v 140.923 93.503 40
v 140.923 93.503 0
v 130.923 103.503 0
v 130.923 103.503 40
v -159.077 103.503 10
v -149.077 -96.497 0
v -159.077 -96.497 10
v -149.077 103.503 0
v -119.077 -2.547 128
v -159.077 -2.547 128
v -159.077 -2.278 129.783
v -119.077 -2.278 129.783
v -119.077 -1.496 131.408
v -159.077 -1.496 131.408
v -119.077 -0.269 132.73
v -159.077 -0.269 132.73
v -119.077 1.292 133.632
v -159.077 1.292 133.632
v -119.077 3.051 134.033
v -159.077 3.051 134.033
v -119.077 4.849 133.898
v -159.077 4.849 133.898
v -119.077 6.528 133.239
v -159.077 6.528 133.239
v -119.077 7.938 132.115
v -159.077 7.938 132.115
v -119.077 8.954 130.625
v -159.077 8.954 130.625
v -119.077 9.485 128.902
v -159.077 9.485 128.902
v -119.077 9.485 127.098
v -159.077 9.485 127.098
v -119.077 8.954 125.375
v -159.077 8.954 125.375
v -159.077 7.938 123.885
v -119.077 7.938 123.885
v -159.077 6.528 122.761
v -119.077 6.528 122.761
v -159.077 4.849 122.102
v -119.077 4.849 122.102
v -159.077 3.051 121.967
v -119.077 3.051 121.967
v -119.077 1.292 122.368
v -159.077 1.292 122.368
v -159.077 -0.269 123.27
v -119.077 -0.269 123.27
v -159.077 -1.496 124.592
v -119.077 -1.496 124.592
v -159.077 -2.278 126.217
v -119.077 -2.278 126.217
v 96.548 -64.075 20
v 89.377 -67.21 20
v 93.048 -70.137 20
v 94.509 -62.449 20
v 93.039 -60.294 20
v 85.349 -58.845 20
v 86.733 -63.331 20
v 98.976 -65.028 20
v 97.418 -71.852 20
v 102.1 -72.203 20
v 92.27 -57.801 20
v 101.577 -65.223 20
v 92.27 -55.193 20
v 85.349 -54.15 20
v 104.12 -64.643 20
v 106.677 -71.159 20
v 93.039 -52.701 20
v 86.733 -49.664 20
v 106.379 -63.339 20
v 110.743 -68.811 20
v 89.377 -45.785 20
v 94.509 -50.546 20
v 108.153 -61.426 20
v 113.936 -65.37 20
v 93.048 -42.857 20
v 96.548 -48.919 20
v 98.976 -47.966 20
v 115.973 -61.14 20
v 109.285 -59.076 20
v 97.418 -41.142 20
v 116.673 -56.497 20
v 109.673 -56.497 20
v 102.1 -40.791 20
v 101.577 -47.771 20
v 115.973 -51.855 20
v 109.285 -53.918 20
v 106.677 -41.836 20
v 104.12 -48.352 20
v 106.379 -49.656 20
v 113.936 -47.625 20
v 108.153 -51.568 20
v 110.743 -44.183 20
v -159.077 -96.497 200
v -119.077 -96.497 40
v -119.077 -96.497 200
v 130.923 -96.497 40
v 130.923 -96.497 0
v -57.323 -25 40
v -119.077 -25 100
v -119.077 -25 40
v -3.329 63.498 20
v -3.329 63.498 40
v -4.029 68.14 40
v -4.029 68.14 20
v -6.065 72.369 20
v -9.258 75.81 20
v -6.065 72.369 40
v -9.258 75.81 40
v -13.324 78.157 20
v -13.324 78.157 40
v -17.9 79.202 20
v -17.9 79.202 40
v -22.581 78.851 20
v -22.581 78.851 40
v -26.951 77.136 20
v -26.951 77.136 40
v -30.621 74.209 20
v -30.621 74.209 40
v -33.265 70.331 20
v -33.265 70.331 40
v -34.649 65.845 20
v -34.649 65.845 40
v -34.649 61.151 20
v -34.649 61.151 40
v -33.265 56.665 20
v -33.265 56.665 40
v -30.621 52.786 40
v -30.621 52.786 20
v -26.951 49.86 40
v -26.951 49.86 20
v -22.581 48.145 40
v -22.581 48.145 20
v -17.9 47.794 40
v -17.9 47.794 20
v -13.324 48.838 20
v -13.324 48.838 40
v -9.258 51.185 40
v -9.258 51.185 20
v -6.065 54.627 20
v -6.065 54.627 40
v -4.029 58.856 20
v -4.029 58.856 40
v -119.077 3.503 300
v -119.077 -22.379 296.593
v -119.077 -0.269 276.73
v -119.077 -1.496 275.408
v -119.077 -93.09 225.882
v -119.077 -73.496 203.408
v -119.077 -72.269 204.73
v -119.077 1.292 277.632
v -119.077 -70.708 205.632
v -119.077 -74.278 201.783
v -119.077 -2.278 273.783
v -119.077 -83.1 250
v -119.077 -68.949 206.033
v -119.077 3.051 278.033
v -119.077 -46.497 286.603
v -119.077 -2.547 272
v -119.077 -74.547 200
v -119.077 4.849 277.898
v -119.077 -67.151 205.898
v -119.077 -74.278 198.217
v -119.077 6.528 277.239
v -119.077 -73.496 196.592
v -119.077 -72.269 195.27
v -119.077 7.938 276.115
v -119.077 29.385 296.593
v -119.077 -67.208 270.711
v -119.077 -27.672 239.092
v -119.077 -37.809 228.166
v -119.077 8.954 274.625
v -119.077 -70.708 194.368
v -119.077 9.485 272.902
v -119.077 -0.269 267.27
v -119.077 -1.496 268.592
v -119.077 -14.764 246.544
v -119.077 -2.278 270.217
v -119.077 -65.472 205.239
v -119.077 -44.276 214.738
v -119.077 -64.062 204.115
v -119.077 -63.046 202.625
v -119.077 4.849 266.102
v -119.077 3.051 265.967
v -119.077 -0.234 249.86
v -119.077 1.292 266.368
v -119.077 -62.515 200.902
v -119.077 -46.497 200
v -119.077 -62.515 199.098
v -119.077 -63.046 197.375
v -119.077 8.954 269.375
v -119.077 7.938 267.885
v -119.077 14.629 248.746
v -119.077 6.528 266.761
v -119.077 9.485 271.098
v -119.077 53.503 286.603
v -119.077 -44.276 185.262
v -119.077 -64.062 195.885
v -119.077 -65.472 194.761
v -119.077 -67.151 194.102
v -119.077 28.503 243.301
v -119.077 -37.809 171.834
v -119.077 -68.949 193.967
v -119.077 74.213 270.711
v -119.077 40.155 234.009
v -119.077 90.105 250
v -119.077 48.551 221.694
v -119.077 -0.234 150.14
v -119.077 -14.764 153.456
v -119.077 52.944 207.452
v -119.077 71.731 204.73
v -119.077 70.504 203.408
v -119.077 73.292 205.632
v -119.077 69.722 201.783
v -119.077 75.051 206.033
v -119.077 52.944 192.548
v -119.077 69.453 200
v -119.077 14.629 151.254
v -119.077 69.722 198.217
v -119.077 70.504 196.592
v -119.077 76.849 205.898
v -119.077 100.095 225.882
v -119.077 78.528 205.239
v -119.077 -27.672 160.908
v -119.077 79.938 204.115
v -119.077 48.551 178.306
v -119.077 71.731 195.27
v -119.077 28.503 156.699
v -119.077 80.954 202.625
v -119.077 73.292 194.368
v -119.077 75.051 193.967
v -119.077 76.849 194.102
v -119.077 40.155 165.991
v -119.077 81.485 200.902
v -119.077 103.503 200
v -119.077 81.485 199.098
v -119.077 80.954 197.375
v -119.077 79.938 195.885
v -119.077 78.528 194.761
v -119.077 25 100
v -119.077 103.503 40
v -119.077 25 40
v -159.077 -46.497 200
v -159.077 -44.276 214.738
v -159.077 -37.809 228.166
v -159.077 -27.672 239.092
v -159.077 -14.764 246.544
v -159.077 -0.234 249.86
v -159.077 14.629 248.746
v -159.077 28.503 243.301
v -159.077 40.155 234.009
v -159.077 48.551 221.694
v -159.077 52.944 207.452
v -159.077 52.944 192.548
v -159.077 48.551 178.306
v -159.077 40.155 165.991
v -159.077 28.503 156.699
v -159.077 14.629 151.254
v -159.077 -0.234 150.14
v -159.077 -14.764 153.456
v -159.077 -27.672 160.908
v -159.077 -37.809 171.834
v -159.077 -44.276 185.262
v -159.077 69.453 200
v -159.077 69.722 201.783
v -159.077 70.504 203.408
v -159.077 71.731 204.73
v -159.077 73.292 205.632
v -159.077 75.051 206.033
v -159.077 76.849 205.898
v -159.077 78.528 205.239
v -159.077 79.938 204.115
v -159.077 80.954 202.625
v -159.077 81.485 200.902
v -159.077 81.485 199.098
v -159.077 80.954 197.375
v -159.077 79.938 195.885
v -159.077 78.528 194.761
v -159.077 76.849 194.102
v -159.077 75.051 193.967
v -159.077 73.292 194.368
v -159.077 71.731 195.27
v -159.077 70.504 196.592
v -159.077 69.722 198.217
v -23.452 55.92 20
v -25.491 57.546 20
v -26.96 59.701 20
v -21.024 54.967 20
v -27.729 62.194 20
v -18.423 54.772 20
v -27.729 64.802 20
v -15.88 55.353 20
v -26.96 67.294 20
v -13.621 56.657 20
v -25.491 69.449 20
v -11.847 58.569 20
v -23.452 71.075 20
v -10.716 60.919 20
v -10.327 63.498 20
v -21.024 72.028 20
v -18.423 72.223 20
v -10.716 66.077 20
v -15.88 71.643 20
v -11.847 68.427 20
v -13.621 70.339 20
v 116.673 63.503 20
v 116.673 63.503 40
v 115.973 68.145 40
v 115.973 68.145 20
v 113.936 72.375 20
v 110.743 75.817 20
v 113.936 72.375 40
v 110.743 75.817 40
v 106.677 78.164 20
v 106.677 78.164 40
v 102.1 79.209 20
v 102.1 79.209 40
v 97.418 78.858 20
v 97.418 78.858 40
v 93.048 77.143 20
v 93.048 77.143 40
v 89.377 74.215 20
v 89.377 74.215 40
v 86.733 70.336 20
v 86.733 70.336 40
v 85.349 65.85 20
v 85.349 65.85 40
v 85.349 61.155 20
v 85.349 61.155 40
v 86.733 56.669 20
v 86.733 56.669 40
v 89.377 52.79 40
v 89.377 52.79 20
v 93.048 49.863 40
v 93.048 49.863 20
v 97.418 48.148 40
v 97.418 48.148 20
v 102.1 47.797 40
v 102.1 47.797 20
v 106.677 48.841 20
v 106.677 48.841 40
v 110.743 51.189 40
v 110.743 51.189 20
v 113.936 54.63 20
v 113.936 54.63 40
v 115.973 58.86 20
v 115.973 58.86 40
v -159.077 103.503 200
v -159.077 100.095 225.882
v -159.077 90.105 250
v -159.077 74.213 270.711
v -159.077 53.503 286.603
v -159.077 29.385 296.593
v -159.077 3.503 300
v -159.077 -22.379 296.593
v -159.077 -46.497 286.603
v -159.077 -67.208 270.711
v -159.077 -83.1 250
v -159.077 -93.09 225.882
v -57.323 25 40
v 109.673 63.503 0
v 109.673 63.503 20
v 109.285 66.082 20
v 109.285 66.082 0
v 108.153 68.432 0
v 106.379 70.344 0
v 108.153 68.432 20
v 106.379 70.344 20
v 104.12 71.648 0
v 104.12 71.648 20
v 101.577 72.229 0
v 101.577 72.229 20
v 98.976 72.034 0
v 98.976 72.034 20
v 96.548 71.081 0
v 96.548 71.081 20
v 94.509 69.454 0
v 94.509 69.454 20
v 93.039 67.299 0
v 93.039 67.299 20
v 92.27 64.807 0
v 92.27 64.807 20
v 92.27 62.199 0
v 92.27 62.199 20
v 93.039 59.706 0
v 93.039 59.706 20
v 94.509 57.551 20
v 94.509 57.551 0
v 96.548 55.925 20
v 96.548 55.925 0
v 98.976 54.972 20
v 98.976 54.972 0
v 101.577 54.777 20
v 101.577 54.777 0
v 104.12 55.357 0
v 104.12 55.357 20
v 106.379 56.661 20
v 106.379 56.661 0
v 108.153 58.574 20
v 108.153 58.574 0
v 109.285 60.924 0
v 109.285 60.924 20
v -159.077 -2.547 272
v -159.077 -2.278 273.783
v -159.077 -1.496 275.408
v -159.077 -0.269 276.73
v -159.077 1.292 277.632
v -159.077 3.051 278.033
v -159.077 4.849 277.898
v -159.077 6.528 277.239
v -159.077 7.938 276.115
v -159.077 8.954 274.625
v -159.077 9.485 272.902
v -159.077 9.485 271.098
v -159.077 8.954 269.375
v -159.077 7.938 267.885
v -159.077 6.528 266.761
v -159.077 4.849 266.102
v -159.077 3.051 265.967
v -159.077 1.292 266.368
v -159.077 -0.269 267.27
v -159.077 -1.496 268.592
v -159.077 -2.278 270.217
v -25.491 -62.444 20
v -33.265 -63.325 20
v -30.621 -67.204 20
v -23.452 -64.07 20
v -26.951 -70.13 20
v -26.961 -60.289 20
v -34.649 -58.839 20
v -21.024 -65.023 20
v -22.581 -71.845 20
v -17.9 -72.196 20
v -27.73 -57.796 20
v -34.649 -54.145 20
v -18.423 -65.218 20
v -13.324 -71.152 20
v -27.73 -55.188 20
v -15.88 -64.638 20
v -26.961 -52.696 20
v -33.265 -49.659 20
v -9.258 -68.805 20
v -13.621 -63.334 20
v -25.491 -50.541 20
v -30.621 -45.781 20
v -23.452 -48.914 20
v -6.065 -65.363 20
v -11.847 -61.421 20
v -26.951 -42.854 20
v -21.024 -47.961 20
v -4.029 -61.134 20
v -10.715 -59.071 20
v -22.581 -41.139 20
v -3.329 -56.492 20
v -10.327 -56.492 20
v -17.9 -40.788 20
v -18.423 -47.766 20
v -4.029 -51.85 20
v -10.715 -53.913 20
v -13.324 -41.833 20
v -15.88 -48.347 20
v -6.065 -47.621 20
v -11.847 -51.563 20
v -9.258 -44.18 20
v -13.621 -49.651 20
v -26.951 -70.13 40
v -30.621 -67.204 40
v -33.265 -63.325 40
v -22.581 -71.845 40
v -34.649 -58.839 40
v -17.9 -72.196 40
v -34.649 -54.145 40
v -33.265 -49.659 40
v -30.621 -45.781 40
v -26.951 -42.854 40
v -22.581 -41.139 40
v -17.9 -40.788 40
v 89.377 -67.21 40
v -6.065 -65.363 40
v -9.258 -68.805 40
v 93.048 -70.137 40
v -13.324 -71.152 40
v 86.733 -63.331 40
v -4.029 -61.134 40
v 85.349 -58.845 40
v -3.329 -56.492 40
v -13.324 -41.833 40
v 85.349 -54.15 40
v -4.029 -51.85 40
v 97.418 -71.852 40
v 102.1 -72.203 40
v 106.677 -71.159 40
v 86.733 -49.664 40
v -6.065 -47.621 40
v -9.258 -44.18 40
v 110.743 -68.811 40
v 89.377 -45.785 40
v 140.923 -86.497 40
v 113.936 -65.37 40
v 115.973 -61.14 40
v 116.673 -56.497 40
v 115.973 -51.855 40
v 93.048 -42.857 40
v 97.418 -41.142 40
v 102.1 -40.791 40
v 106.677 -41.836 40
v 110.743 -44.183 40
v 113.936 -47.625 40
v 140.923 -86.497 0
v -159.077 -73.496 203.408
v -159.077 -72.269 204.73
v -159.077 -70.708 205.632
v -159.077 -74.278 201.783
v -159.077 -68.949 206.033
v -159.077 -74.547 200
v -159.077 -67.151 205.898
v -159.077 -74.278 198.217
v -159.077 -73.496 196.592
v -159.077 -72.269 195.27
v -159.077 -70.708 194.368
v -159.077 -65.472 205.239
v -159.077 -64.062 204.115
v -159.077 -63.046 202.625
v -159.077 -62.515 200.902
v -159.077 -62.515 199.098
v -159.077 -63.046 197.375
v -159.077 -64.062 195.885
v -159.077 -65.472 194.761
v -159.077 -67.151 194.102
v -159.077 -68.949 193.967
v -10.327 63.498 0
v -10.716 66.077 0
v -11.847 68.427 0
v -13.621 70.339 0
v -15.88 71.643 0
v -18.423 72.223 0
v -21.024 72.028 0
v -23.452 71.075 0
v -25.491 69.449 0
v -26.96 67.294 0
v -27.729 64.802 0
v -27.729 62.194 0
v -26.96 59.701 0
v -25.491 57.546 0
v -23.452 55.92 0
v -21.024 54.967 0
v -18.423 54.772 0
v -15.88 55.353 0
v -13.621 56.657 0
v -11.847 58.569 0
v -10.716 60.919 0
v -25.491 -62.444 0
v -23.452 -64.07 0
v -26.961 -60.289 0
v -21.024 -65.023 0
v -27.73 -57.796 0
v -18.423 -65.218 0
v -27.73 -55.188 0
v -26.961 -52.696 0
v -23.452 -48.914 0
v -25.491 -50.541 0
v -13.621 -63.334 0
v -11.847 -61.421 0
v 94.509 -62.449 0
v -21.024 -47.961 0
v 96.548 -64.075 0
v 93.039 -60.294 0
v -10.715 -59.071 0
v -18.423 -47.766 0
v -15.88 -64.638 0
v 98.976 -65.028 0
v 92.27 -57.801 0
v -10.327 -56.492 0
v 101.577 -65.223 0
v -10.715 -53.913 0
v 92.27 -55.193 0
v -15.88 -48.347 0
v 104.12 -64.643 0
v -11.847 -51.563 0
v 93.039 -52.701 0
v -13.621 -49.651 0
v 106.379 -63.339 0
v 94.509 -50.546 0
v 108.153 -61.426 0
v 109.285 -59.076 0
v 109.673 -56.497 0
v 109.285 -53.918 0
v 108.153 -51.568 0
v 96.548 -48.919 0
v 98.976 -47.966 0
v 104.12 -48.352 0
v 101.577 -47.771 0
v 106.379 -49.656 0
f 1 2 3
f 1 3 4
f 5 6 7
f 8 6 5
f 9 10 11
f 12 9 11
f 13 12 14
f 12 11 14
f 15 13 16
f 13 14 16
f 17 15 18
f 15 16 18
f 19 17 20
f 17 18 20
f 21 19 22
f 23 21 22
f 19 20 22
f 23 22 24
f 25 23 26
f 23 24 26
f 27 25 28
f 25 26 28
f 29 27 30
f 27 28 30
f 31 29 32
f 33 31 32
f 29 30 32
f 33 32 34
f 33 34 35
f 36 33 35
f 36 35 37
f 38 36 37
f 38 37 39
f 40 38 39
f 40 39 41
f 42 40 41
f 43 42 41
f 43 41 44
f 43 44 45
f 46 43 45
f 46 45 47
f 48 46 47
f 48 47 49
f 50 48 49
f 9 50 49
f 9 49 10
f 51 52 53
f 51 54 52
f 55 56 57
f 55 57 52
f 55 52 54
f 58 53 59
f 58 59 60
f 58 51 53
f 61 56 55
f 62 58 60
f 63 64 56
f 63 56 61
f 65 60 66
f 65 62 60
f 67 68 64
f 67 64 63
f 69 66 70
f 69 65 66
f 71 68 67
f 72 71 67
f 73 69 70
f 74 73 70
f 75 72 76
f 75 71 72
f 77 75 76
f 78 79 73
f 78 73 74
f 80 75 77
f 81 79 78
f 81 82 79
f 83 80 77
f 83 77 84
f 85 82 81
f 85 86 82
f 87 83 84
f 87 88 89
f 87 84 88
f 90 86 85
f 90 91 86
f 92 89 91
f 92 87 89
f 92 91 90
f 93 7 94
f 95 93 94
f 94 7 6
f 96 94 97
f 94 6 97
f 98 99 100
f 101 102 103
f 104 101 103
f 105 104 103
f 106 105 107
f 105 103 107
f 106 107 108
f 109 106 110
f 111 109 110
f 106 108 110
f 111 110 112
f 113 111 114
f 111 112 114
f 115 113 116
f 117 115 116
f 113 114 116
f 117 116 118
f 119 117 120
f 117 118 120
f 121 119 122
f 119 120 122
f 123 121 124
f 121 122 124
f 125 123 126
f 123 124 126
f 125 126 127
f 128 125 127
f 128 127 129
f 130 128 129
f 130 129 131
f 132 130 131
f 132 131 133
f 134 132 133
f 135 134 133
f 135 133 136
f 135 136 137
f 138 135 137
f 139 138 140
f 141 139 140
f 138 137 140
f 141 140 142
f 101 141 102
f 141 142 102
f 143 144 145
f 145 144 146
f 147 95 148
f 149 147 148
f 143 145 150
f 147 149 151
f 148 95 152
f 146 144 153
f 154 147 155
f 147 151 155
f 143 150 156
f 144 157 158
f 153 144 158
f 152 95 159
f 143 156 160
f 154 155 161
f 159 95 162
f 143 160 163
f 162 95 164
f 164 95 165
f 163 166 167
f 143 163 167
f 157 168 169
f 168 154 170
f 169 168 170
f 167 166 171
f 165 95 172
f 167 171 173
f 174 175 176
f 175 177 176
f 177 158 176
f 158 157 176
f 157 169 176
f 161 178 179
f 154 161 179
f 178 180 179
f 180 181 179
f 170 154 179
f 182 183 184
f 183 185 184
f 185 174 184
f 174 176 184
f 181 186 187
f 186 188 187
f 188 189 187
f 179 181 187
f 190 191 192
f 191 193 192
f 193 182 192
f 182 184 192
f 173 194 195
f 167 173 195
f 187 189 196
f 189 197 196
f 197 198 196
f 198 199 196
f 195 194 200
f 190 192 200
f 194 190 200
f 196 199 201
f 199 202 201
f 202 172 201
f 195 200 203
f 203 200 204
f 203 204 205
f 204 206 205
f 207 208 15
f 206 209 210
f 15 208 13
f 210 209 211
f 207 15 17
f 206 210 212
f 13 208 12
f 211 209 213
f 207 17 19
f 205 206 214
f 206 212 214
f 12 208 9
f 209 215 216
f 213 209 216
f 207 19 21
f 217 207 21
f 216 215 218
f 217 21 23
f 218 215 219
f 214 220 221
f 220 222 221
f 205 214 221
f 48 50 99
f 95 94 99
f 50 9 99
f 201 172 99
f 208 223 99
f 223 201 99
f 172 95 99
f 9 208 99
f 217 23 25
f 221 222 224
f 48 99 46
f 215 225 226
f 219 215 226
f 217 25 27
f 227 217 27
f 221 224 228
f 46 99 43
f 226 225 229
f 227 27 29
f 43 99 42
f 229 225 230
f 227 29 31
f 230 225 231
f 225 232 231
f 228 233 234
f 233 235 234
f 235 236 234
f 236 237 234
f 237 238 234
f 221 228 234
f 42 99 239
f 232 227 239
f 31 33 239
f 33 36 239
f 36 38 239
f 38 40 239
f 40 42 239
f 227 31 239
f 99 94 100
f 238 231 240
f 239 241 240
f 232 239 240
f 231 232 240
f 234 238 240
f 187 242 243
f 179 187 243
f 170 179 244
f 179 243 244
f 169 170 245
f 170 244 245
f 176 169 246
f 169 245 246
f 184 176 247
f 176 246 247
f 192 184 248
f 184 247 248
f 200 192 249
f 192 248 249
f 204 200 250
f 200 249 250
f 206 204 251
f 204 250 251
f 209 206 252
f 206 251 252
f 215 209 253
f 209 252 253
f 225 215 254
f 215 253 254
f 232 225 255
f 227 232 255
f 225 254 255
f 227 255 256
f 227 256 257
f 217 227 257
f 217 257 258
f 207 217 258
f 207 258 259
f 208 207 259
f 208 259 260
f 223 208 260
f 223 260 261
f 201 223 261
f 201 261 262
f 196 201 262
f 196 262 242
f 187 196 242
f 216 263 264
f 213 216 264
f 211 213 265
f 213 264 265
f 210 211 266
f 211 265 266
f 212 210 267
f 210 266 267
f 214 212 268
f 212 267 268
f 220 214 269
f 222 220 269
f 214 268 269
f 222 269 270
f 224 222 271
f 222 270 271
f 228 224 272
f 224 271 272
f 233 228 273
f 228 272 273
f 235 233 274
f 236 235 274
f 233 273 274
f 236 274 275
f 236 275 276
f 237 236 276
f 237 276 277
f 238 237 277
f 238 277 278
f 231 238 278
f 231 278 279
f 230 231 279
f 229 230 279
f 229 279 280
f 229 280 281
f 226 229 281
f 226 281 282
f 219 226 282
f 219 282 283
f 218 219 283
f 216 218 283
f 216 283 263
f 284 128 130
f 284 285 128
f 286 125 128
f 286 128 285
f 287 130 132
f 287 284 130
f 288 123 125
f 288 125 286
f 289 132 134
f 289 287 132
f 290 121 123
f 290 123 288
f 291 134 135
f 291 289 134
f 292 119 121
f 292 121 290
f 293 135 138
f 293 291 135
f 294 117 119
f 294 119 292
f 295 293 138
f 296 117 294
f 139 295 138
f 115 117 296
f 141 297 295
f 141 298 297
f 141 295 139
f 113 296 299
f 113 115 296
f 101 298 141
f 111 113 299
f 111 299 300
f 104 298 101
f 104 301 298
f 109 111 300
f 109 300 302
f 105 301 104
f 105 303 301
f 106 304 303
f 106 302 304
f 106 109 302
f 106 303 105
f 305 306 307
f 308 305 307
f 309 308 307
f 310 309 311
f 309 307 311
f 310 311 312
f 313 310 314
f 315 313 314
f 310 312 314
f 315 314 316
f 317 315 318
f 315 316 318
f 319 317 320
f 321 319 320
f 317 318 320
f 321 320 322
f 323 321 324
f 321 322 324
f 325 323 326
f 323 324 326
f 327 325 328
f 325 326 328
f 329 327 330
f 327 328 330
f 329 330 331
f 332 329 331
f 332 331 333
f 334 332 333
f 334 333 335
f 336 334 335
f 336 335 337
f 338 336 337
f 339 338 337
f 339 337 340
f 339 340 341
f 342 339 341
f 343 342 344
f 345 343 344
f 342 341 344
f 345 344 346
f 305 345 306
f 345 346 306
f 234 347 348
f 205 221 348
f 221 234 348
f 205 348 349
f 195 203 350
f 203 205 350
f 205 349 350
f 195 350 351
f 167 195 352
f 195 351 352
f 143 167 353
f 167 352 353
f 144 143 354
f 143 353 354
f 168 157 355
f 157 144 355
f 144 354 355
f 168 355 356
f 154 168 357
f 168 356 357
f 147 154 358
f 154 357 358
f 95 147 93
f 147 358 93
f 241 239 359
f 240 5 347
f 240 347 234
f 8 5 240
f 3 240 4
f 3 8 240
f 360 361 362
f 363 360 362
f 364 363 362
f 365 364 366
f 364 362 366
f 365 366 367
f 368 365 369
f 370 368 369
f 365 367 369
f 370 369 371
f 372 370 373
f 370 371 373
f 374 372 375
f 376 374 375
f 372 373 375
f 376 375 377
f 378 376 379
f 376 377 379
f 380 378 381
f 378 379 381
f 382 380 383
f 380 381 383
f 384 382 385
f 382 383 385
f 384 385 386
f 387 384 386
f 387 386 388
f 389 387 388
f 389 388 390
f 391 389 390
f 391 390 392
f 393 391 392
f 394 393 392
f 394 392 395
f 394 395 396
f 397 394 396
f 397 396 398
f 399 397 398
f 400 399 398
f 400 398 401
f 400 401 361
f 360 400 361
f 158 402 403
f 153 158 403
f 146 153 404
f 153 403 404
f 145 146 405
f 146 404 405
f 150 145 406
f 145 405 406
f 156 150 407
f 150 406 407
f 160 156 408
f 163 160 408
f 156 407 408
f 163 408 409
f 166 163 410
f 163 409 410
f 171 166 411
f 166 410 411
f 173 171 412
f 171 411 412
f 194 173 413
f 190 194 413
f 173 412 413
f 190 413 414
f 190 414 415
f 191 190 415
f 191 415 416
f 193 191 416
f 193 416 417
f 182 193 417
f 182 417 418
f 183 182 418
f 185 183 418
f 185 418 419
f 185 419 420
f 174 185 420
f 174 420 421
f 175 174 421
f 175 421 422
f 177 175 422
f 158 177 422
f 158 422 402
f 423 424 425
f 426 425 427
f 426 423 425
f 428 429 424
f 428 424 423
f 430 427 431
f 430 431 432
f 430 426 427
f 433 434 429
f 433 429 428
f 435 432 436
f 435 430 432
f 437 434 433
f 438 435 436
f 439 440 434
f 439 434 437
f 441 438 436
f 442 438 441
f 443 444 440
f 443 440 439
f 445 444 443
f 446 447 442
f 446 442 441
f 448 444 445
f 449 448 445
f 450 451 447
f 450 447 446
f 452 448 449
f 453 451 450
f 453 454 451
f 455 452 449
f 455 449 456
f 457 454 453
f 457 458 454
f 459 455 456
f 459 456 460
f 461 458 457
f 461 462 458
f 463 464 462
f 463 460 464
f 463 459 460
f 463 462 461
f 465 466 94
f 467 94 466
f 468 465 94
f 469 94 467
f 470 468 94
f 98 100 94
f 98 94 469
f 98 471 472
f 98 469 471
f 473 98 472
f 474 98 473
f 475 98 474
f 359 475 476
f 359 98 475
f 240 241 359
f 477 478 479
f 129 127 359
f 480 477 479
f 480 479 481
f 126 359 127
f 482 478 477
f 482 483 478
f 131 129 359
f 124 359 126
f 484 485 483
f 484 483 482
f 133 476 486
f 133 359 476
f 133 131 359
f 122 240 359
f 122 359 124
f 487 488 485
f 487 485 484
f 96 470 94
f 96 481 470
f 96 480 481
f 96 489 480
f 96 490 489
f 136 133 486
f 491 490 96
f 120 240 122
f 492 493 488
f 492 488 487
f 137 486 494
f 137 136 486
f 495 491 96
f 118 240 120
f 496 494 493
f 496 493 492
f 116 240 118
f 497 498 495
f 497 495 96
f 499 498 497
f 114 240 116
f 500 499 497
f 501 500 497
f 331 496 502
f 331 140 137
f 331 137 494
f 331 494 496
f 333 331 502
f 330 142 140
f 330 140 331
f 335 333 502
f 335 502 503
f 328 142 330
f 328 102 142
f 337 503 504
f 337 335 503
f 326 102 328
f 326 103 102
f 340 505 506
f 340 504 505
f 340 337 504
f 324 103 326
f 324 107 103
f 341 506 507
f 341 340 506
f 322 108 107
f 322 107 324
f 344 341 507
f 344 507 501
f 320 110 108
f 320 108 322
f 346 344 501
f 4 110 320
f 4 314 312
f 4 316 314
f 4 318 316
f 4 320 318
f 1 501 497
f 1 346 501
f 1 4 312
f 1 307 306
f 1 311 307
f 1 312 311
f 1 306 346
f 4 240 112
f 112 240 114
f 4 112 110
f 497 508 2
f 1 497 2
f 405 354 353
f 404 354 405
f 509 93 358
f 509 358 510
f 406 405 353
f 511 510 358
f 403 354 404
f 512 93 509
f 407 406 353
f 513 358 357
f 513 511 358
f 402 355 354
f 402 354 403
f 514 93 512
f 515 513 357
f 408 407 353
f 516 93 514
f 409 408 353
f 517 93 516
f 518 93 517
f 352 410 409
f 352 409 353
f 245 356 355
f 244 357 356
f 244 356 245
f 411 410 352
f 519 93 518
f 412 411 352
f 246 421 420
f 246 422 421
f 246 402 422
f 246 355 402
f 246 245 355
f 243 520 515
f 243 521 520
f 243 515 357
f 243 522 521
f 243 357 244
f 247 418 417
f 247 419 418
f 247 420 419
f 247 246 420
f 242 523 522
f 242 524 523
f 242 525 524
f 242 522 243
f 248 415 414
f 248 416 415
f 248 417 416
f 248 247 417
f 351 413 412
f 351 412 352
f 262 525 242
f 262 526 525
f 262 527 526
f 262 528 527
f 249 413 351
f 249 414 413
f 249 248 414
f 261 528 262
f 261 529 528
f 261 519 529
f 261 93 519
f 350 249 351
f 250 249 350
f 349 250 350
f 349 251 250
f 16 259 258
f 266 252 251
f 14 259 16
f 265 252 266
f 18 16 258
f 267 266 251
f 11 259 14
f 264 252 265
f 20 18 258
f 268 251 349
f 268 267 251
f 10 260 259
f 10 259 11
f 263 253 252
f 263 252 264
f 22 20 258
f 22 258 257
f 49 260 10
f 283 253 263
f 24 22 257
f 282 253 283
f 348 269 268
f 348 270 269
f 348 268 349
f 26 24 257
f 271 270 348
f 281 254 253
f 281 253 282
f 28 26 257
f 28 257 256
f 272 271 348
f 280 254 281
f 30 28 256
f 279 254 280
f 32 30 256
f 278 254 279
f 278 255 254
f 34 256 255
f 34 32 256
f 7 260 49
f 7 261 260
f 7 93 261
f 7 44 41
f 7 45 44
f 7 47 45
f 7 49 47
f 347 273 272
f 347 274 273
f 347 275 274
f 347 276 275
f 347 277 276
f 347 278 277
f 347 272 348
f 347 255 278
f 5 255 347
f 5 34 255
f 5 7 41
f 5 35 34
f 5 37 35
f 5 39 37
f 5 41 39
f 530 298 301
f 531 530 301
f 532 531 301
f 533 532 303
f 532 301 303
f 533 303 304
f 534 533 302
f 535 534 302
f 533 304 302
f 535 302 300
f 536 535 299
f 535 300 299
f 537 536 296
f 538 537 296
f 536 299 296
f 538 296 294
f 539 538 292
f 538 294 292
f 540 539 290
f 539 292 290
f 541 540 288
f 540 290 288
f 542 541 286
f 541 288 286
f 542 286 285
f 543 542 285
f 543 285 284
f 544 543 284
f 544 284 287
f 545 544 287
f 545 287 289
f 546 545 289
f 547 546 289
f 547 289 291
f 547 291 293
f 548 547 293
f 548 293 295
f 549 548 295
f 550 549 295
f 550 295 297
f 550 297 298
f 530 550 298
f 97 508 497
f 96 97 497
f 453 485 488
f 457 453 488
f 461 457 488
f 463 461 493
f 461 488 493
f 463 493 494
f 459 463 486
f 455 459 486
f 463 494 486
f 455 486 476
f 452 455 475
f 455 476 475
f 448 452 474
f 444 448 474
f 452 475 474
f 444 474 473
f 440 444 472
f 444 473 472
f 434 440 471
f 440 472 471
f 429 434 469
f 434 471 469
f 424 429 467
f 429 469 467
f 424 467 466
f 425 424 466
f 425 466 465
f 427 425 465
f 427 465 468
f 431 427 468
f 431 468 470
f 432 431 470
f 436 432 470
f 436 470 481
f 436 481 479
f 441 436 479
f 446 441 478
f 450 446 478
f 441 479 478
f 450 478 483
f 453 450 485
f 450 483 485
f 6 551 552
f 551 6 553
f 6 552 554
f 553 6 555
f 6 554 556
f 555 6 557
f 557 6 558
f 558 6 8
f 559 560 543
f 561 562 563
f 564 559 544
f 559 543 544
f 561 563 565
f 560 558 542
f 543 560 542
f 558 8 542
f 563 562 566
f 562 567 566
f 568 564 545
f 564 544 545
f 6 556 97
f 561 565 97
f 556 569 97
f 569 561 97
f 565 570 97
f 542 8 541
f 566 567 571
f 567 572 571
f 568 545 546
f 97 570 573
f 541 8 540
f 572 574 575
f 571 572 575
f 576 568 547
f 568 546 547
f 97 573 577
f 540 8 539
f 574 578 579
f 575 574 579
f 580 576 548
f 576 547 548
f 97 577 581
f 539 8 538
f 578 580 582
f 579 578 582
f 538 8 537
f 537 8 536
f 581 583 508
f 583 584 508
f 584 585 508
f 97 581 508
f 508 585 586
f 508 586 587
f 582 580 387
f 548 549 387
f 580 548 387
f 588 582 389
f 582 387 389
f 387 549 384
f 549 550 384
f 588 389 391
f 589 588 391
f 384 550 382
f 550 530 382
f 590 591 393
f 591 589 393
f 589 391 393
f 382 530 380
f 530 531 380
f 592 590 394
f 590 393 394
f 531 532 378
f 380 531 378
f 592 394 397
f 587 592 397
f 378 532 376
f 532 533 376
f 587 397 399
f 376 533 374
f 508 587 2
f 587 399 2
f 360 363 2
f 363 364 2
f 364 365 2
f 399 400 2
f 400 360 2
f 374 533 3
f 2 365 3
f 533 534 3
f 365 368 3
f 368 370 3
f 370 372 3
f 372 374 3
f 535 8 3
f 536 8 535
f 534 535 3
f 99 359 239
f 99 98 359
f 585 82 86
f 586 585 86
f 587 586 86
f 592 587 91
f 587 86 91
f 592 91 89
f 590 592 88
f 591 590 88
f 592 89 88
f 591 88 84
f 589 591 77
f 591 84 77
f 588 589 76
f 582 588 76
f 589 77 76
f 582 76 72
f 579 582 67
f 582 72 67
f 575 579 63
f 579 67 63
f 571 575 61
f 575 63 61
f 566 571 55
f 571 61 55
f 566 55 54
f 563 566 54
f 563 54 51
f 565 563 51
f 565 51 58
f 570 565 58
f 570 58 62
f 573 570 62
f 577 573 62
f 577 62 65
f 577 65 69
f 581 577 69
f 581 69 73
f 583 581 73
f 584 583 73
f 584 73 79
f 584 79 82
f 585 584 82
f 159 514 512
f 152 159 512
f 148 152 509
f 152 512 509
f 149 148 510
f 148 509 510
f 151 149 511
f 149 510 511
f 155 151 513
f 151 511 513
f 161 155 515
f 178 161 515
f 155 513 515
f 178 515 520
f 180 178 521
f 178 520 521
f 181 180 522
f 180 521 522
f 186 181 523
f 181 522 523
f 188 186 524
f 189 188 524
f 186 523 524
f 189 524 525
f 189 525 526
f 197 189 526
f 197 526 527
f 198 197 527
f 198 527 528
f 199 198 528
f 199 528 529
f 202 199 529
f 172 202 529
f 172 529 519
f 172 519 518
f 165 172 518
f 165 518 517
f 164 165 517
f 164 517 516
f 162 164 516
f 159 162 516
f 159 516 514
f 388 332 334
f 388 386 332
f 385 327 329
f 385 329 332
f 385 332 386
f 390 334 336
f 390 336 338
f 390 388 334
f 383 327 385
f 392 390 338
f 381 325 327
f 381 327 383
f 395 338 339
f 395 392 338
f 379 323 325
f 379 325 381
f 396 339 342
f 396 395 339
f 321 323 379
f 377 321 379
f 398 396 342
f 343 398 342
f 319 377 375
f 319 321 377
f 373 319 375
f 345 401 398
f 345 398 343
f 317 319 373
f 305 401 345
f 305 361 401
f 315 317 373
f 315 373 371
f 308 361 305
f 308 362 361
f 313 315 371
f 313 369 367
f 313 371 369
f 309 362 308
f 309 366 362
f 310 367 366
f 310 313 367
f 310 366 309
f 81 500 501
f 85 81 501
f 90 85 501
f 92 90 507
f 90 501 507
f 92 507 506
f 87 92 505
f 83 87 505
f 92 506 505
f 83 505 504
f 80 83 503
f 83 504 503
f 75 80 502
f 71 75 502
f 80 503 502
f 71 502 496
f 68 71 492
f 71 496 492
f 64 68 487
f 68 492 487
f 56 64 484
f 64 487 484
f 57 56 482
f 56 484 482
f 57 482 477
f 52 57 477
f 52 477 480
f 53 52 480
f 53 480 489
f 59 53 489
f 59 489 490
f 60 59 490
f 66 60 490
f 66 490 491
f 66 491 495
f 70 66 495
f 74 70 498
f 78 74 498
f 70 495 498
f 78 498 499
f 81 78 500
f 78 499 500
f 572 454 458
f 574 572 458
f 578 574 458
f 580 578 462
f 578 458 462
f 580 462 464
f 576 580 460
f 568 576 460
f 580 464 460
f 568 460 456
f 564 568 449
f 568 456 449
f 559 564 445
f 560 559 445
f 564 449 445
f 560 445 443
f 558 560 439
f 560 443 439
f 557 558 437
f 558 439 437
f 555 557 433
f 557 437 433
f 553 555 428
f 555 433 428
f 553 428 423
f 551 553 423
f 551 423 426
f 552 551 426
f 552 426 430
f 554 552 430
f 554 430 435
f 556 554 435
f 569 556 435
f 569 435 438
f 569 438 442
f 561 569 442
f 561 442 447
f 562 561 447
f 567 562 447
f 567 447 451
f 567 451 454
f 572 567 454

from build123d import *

# Parameters (mm, degrees)
F0_W           = 300
F0_H           = 200
F1_DEPTH       = 40
F2_R           = 15.75
F2_R_2         = 15.748
F3_DEPTH       = 20
F4_R           = 8.75
F4_R_2         = 8.7503
F5_DEPTH       = 40.001
F6_W           = 40
F6_H           = 200
F7_DEPTH       = 260
F8_R           = 50
F9_DEPTH       = 300.001
F11_D          = 12.1
F12_SIZE       = 10
F14_DEPTH      = 25
F14_DEPTH_BACK = 25


with BuildPart() as f1:
    # F0 (on Top) → F1 (new body)
    with BuildSketch(Plane.XY):
        with Locations((-9.0769985841, 3.5027405247)):
            Rectangle(F0_W, F0_H)
    extrude(amount=F1_DEPTH)

    # F2 (on face) → F3 (cut)
    with BuildSketch(Plane.XY.offset(40)):
        with Locations((100.9230014159, 63.5027405247)):
            Circle(F2_R)
        with Locations((100.9230014159, -56.4972594753)):
            Circle(F2_R)
        with Locations((-19.0769985841, 63.4977405247)):
            Circle(F2_R_2)
        with Locations((-19.0769985841, -56.4922594753)):
            Circle(F2_R_2)
    extrude(amount=-F3_DEPTH, mode=Mode.SUBTRACT)

    # F4 (on face) → F5 (cut, through all)
    with BuildSketch(Plane.XY.offset(40)):
        with Locations((-19.0769985841, 63.4977405247)):
            Circle(F4_R)
        with Locations((100.9230014159, 63.5027405247)):
            Circle(F4_R_2)
        with Locations((-19.0769985841, -56.4922594753)):
            Circle(F4_R_2)
        with Locations((100.9230014159, -56.4972594753)):
            Circle(F4_R_2)
    extrude(amount=-F5_DEPTH, mode=Mode.SUBTRACT)

    # F6 (on face) → F7 (join)
    with BuildSketch(Plane.XY.offset(40)):
        with Locations((-139.0769985841, 3.5027405247)):
            Rectangle(F6_W, F6_H)
    extrude(amount=F7_DEPTH)

    # F8 (on face) → F9 (cut, through all)
    with BuildSketch(Plane(origin=(-159.0769985841, 0, 0), x_dir=(0, -1, 0), z_dir=(-1, 0, 0))):
        with Locations((-3.5027405247, 200)):
            Circle(F8_R)
        with BuildLine():
            ThreePointArc((-3.5027399336, 300), (67.2079378029, 270.7106779097), (96.4972594753, 200))
            Line((96.4972594753, 200), (96.4972594753, 300))
            Line((96.4972594753, 300), (-3.5027399336, 300))
        make_face()
        with BuildLine():
            ThreePointArc((-103.5027405247, 200), (-74.2134184344, 270.7106783276), (-3.5027399336, 300))
            Line((-3.5027399336, 300), (-103.5027405247, 300))
            Line((-103.5027405247, 300), (-103.5027405247, 200))
        make_face()
    extrude(amount=-F9_DEPTH, mode=Mode.SUBTRACT)

    # F11 (through all)
    with Locations(Plane.YZ.offset(-119.0769985841)):
        with Locations((3.5027405247, 272), (75.5027405247, 200), (3.5027405247, 128), (-68.4972594753, 200)):
            Hole(F11_D / 2)

    # F12
    f12_edges = [f1.edges().sort_by_distance(p)[0] for p in [
        (140.923001, -96.497259, 20),
        (140.923001, 103.502741, 20),
        (-159.076999, 3.502741, 0),
    ]]
    chamfer(f12_edges, length=F12_SIZE)

    # F13 (on Front) → F14 (join, two sides)
    with BuildSketch(Plane.XZ) as f14_sk:
        Polygon((-119.0769985841, 100), (-119.0769985841, 40), (-57.3225580156, 40), align=None)
    extrude(amount=F14_DEPTH)
    extrude(f14_sk.sketch, amount=-F14_DEPTH_BACK)


solid = f1.part
